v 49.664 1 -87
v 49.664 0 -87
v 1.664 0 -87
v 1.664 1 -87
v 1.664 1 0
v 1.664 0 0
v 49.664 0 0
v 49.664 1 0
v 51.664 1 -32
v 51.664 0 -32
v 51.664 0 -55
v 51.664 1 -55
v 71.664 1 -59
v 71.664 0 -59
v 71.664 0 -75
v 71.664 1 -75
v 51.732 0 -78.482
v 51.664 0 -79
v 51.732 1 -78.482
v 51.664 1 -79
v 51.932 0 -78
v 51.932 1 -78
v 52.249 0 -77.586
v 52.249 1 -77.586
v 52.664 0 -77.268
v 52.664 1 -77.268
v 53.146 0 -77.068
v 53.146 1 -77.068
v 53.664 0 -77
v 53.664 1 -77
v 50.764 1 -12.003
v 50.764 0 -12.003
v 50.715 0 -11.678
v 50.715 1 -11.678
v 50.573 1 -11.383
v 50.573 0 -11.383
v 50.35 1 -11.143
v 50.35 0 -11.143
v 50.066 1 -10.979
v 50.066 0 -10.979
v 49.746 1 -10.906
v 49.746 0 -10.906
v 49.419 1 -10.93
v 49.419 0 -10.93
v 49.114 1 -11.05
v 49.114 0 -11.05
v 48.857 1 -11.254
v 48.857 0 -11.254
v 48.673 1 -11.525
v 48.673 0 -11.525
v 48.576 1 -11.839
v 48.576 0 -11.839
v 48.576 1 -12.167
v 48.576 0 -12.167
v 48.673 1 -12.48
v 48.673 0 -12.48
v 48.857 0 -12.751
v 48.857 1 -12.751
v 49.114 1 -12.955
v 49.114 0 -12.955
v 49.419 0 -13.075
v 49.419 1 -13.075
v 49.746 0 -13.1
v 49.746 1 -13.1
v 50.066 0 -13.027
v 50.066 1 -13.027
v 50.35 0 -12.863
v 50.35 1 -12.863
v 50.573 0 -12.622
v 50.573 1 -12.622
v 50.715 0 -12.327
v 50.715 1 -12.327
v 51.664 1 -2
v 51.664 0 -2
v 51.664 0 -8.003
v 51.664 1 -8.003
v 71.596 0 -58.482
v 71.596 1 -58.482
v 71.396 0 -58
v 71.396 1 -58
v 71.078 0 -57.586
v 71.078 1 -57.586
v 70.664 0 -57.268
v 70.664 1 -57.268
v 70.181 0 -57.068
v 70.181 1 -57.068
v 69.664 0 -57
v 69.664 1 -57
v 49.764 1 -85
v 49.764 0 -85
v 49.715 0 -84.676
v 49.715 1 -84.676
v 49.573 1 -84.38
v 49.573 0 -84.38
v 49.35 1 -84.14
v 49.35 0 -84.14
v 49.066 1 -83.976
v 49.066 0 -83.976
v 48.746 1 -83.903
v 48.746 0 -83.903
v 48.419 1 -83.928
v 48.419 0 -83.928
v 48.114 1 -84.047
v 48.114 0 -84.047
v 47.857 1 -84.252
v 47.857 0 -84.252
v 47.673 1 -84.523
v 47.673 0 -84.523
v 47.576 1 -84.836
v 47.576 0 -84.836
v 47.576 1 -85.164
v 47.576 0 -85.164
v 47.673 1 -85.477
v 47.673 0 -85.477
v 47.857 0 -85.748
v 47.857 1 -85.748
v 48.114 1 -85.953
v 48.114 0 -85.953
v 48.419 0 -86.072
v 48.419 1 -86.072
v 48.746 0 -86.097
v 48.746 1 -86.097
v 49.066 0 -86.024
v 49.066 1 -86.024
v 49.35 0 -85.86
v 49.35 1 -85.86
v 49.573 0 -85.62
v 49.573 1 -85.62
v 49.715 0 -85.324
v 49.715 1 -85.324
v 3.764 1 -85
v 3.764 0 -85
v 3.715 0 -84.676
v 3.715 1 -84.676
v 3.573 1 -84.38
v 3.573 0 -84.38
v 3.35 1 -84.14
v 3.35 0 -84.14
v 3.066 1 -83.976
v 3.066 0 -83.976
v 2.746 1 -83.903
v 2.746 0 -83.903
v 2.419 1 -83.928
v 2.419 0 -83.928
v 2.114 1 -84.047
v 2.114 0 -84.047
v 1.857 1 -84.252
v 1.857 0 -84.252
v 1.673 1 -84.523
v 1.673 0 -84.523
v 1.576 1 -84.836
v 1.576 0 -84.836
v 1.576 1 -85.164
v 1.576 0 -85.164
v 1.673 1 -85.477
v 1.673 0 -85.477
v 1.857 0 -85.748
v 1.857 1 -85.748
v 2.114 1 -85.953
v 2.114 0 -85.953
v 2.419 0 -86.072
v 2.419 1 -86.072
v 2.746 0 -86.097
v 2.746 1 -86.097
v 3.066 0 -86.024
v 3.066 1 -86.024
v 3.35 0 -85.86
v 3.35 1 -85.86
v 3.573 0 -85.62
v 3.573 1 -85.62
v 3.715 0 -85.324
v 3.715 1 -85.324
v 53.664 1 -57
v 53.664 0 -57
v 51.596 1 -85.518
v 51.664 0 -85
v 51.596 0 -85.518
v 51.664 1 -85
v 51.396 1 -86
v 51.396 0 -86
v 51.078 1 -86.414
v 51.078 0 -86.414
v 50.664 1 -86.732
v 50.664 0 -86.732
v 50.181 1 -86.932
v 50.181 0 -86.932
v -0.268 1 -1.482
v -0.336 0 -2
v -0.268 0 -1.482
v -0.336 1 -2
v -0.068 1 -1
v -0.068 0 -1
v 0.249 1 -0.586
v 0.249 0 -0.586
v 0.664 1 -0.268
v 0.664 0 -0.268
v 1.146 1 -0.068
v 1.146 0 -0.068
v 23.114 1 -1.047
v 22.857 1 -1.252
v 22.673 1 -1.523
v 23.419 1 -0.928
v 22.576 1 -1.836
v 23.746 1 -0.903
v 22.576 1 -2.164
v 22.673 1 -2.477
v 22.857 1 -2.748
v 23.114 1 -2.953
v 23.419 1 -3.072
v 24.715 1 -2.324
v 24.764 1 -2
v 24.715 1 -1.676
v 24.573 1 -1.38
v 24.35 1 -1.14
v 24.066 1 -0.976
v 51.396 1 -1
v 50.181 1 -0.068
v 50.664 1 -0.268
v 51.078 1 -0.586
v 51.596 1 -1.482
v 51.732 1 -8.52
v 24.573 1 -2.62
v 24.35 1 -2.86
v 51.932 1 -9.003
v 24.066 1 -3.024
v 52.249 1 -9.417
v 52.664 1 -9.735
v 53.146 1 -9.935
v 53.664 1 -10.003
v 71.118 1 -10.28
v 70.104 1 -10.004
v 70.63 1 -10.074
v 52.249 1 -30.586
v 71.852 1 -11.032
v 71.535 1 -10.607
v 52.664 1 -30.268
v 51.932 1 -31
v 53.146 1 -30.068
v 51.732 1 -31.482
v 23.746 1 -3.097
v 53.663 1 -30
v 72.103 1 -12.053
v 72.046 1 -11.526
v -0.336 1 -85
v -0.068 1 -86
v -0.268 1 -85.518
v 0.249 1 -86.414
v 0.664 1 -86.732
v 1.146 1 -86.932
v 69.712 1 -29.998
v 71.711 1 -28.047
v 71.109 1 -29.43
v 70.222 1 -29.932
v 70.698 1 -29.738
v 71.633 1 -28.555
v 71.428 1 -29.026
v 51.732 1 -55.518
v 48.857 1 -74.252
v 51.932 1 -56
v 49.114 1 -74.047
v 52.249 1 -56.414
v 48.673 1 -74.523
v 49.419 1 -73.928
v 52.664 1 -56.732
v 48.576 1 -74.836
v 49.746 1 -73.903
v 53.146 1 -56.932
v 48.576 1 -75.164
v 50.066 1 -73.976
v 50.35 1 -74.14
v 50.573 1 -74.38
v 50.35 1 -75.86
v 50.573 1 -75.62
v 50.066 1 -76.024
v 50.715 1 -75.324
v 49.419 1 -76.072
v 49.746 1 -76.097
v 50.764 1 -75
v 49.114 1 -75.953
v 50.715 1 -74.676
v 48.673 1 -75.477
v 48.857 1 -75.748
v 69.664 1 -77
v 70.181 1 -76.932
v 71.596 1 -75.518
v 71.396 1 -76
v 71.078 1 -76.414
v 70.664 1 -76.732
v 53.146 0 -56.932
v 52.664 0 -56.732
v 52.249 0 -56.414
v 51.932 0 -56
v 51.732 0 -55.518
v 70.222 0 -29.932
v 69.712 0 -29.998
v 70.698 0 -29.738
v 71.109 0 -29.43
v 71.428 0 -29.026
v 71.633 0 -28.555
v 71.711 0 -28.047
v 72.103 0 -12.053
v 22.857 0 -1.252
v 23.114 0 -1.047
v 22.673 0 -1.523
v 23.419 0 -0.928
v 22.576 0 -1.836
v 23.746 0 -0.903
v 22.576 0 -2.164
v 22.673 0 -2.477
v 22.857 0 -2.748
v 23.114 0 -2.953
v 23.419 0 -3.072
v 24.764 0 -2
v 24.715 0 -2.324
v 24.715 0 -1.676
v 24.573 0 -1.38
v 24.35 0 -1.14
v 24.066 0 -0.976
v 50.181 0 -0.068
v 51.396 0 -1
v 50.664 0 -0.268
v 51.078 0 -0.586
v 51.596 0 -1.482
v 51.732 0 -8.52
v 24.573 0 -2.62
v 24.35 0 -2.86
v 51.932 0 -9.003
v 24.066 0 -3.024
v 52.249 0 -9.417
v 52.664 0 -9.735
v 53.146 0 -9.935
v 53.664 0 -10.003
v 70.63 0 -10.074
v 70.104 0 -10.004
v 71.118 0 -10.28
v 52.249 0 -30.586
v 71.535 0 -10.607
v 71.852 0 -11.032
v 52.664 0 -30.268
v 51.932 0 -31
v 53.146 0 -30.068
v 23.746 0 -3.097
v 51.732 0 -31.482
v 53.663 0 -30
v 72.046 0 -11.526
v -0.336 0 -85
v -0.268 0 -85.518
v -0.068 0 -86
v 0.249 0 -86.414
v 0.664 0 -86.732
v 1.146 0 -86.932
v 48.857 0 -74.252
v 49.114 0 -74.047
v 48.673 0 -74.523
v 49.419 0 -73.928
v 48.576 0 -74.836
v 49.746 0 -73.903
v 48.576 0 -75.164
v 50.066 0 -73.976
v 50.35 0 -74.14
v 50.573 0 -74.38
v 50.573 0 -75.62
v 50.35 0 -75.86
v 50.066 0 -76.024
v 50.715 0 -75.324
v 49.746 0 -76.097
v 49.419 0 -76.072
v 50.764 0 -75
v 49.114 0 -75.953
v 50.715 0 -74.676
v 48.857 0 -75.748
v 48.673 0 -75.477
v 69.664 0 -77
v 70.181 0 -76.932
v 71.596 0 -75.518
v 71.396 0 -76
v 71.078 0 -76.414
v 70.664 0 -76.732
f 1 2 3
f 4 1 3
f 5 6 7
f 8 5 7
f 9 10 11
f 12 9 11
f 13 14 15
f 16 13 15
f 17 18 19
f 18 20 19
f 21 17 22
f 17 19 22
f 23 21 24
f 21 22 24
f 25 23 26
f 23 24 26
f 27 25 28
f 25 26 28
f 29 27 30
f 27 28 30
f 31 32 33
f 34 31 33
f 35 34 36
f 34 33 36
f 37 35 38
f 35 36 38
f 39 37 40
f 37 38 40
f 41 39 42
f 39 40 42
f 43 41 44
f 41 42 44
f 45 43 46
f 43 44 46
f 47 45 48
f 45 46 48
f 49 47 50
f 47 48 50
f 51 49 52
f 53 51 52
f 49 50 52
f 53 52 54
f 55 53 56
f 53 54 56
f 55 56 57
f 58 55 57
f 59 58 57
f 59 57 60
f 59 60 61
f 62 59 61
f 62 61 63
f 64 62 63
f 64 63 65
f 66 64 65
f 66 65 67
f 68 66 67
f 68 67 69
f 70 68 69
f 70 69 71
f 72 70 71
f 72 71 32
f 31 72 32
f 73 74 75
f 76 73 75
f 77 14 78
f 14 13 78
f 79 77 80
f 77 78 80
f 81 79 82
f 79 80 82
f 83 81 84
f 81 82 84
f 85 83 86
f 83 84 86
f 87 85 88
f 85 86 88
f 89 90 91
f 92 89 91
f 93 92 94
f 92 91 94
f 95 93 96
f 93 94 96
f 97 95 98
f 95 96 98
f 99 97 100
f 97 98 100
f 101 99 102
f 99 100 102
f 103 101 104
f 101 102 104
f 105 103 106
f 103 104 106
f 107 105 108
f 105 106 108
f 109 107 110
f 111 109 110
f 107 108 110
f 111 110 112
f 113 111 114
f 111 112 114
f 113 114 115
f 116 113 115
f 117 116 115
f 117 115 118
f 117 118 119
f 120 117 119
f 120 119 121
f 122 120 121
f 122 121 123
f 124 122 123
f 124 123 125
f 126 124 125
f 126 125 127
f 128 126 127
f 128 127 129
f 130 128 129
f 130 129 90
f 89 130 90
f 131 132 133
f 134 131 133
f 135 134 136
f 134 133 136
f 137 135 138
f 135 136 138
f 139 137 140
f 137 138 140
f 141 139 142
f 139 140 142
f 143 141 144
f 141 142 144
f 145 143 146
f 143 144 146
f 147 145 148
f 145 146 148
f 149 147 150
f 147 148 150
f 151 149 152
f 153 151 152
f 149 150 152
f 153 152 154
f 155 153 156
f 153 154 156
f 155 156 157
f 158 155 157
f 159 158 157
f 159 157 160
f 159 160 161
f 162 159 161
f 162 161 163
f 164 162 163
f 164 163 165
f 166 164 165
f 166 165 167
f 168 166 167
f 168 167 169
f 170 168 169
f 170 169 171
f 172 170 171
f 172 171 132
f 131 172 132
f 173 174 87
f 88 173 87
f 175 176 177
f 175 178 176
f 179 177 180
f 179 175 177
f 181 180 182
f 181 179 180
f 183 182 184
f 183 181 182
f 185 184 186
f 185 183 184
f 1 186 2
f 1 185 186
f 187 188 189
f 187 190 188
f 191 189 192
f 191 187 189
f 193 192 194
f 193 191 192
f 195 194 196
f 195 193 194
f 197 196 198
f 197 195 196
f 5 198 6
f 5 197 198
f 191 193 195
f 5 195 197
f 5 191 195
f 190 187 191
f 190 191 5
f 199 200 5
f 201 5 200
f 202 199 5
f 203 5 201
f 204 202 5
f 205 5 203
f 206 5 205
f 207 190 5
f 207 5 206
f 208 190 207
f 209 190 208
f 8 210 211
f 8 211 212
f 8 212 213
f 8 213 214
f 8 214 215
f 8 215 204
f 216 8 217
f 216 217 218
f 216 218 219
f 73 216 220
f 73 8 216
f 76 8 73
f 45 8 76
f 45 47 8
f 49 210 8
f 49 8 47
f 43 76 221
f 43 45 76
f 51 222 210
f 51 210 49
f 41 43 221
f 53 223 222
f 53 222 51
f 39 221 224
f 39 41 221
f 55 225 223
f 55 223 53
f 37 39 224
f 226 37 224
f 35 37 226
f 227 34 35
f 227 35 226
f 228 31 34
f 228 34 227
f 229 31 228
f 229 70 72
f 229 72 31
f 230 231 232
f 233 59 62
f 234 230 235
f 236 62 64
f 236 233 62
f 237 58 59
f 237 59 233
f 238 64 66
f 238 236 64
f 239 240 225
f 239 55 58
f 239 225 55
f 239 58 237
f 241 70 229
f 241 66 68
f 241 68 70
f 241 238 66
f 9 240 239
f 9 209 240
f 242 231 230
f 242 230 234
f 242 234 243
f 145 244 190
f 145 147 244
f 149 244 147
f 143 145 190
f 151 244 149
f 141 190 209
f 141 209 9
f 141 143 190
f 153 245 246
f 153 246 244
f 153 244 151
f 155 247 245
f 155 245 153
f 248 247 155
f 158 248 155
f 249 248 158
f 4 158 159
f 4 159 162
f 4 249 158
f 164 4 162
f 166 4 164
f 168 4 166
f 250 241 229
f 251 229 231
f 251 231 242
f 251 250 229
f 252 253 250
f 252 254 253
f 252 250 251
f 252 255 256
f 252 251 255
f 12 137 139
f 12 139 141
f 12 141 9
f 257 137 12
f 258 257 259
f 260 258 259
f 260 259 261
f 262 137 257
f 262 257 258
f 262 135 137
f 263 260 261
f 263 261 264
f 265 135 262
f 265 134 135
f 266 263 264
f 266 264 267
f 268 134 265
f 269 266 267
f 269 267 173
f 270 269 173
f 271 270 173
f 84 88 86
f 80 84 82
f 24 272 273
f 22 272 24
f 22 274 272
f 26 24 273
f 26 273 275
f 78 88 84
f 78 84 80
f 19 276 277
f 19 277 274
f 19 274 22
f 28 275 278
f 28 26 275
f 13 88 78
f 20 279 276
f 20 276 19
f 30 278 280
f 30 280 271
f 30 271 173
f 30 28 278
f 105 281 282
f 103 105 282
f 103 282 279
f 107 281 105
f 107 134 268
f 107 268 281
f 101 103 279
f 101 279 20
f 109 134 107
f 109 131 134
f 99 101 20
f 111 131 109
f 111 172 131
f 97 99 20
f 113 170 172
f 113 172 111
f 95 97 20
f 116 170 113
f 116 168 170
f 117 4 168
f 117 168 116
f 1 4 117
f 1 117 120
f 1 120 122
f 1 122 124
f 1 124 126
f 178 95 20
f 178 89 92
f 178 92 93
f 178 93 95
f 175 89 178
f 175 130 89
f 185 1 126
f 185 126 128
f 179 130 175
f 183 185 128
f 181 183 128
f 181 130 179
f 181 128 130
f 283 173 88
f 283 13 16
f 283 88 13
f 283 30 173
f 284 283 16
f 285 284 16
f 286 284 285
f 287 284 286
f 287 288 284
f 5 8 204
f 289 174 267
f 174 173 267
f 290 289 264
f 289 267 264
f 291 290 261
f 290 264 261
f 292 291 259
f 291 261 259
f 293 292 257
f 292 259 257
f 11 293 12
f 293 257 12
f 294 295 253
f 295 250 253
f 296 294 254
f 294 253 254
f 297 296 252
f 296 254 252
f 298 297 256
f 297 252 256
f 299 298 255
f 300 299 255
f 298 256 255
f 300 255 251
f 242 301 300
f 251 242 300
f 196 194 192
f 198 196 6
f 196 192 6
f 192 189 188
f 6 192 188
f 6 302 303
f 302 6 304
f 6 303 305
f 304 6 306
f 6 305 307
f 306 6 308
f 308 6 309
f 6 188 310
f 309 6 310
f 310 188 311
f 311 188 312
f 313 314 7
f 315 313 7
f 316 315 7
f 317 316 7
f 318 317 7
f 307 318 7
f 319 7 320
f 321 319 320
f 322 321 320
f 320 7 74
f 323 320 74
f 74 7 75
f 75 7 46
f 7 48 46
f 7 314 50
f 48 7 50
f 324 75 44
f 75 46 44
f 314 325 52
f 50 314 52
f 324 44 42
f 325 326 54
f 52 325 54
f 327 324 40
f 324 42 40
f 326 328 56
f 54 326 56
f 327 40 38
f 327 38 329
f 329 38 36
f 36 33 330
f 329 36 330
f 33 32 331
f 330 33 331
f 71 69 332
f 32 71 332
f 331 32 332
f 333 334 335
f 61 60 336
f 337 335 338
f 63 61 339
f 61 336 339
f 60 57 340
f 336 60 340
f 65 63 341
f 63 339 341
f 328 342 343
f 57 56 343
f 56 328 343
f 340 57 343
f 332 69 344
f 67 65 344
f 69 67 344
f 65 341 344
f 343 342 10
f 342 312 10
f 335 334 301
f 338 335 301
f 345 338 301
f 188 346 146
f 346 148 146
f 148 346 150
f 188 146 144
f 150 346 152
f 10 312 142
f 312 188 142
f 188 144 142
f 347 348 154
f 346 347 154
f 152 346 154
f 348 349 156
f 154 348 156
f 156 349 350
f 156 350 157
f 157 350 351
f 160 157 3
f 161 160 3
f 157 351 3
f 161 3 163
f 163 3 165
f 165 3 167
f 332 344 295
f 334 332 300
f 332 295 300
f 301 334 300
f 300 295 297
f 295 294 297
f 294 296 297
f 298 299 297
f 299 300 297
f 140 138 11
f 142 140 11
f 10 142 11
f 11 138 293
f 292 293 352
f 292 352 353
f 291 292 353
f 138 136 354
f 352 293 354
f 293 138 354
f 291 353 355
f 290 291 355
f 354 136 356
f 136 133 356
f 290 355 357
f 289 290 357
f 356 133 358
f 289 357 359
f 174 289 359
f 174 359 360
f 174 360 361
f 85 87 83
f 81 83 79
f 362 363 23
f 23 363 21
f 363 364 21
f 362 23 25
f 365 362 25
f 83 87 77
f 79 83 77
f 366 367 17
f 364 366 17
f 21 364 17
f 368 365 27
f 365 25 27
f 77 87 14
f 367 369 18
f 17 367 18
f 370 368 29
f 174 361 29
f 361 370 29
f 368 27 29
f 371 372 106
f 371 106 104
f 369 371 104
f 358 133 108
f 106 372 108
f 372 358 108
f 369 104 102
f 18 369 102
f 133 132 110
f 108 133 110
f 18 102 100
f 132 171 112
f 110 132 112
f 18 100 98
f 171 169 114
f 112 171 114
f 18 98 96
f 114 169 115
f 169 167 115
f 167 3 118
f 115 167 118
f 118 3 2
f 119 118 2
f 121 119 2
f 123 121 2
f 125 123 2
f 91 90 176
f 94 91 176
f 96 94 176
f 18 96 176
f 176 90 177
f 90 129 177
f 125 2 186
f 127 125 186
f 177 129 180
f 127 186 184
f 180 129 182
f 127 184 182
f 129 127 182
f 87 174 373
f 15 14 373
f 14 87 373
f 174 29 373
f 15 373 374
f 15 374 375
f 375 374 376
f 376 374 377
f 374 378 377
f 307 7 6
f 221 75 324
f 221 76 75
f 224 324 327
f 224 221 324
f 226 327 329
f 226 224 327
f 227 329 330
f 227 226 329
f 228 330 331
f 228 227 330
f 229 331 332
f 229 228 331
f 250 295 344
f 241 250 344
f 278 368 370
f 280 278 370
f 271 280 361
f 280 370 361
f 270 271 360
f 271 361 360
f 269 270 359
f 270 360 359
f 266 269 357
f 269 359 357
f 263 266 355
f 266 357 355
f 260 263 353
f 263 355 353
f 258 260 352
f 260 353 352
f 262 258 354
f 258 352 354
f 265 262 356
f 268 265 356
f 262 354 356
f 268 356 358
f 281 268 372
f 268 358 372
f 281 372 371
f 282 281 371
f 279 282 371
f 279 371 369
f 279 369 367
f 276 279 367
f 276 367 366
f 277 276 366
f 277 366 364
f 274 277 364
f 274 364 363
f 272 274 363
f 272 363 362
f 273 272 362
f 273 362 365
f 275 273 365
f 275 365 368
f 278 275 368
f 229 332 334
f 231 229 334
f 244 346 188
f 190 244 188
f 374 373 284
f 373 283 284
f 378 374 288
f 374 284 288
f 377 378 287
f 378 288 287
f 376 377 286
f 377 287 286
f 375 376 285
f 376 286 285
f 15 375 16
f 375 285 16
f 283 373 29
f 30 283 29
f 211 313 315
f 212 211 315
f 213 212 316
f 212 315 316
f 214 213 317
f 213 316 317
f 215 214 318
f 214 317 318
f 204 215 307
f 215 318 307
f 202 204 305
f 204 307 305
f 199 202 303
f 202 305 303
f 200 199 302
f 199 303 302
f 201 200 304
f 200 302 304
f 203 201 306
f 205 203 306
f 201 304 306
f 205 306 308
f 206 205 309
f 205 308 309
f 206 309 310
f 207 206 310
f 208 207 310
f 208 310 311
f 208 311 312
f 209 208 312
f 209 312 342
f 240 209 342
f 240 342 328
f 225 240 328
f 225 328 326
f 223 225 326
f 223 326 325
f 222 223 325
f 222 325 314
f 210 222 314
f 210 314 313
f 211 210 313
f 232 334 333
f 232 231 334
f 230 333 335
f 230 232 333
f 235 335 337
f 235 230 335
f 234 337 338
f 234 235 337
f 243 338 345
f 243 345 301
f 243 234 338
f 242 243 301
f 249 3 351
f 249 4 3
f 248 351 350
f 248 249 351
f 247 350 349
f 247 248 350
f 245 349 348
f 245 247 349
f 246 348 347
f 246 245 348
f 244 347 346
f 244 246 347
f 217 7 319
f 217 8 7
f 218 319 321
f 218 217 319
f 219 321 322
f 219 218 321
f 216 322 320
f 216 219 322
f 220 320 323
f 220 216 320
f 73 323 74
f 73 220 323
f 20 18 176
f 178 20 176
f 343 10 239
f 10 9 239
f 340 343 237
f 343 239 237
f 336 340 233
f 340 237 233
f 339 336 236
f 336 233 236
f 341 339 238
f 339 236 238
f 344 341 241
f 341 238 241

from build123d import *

# Parameters (mm, degrees)
BOSS_EXTRUDE1_DEPTH = 1
SKETCH2_R           = 1.1
CUT_EXTRUDE1_DEPTH  = 4
FILLET1_R           = 2


with BuildPart() as part:
    # Sketch1 → Boss-Extrude1 (new body)
    with BuildSketch(Plane(origin=(0, 0, 0), x_dir=(1, 0, 0), z_dir=(0, 1, 0))):
        Polygon((51.663673174, 77), (51.663673174, 87), (-0.336326826, 87), (-0.336326826, 0), (51.663673174, 0), (51.663673174, 10.002759049), (72.15352325, 10.003966236), (71.663673071, 29.997966506), (51.663673174, 30), (51.663673174, 57), (71.663673174, 57), (71.663673174, 77), align=None)
    extrude(amount=BOSS_EXTRUDE1_DEPTH)

    # Sketch2 → Cut-Extrude1 (cut)
    with BuildSketch(Plane.XZ):
        with Locations((2.663673174, -85)):
            Circle(SKETCH2_R)
        with Locations((48.663673174, -85)):
            Circle(SKETCH2_R)
        with Locations((23.663673174, -2)):
            Circle(SKETCH2_R)
        with Locations((49.663673174, -12.002641219)):
            Circle(SKETCH2_R)
        with Locations((49.663673174, -75)):
            Circle(SKETCH2_R)
    extrude(amount=-CUT_EXTRUDE1_DEPTH, mode=Mode.SUBTRACT)

    # Fillet1
    fillet1_edges = [part.edges().sort_by_distance(p)[0] for p in [
        (-0.336326826, 0.5, -87),
        (51.663673174, 0.5, -87),
        (51.663673174, 0.5, -77),
        (71.663673174, 0.5, -77),
        (71.663673174, 0.5, -57),
        (51.663673174, 0.5, -57),
        (51.663673174, 0.5, -30),
        (71.663673071, 0.5, -29.997966506),
        (72.15352325, 0.5, -10.003966236),
        (51.663673174, 0.5, -10.002759049),
        (51.663673174, 0.5, 0),
        (-0.336326826, 0.5, 0),
    ]]
    fillet(fillet1_edges, radius=FILLET1_R)


solid = part.part
